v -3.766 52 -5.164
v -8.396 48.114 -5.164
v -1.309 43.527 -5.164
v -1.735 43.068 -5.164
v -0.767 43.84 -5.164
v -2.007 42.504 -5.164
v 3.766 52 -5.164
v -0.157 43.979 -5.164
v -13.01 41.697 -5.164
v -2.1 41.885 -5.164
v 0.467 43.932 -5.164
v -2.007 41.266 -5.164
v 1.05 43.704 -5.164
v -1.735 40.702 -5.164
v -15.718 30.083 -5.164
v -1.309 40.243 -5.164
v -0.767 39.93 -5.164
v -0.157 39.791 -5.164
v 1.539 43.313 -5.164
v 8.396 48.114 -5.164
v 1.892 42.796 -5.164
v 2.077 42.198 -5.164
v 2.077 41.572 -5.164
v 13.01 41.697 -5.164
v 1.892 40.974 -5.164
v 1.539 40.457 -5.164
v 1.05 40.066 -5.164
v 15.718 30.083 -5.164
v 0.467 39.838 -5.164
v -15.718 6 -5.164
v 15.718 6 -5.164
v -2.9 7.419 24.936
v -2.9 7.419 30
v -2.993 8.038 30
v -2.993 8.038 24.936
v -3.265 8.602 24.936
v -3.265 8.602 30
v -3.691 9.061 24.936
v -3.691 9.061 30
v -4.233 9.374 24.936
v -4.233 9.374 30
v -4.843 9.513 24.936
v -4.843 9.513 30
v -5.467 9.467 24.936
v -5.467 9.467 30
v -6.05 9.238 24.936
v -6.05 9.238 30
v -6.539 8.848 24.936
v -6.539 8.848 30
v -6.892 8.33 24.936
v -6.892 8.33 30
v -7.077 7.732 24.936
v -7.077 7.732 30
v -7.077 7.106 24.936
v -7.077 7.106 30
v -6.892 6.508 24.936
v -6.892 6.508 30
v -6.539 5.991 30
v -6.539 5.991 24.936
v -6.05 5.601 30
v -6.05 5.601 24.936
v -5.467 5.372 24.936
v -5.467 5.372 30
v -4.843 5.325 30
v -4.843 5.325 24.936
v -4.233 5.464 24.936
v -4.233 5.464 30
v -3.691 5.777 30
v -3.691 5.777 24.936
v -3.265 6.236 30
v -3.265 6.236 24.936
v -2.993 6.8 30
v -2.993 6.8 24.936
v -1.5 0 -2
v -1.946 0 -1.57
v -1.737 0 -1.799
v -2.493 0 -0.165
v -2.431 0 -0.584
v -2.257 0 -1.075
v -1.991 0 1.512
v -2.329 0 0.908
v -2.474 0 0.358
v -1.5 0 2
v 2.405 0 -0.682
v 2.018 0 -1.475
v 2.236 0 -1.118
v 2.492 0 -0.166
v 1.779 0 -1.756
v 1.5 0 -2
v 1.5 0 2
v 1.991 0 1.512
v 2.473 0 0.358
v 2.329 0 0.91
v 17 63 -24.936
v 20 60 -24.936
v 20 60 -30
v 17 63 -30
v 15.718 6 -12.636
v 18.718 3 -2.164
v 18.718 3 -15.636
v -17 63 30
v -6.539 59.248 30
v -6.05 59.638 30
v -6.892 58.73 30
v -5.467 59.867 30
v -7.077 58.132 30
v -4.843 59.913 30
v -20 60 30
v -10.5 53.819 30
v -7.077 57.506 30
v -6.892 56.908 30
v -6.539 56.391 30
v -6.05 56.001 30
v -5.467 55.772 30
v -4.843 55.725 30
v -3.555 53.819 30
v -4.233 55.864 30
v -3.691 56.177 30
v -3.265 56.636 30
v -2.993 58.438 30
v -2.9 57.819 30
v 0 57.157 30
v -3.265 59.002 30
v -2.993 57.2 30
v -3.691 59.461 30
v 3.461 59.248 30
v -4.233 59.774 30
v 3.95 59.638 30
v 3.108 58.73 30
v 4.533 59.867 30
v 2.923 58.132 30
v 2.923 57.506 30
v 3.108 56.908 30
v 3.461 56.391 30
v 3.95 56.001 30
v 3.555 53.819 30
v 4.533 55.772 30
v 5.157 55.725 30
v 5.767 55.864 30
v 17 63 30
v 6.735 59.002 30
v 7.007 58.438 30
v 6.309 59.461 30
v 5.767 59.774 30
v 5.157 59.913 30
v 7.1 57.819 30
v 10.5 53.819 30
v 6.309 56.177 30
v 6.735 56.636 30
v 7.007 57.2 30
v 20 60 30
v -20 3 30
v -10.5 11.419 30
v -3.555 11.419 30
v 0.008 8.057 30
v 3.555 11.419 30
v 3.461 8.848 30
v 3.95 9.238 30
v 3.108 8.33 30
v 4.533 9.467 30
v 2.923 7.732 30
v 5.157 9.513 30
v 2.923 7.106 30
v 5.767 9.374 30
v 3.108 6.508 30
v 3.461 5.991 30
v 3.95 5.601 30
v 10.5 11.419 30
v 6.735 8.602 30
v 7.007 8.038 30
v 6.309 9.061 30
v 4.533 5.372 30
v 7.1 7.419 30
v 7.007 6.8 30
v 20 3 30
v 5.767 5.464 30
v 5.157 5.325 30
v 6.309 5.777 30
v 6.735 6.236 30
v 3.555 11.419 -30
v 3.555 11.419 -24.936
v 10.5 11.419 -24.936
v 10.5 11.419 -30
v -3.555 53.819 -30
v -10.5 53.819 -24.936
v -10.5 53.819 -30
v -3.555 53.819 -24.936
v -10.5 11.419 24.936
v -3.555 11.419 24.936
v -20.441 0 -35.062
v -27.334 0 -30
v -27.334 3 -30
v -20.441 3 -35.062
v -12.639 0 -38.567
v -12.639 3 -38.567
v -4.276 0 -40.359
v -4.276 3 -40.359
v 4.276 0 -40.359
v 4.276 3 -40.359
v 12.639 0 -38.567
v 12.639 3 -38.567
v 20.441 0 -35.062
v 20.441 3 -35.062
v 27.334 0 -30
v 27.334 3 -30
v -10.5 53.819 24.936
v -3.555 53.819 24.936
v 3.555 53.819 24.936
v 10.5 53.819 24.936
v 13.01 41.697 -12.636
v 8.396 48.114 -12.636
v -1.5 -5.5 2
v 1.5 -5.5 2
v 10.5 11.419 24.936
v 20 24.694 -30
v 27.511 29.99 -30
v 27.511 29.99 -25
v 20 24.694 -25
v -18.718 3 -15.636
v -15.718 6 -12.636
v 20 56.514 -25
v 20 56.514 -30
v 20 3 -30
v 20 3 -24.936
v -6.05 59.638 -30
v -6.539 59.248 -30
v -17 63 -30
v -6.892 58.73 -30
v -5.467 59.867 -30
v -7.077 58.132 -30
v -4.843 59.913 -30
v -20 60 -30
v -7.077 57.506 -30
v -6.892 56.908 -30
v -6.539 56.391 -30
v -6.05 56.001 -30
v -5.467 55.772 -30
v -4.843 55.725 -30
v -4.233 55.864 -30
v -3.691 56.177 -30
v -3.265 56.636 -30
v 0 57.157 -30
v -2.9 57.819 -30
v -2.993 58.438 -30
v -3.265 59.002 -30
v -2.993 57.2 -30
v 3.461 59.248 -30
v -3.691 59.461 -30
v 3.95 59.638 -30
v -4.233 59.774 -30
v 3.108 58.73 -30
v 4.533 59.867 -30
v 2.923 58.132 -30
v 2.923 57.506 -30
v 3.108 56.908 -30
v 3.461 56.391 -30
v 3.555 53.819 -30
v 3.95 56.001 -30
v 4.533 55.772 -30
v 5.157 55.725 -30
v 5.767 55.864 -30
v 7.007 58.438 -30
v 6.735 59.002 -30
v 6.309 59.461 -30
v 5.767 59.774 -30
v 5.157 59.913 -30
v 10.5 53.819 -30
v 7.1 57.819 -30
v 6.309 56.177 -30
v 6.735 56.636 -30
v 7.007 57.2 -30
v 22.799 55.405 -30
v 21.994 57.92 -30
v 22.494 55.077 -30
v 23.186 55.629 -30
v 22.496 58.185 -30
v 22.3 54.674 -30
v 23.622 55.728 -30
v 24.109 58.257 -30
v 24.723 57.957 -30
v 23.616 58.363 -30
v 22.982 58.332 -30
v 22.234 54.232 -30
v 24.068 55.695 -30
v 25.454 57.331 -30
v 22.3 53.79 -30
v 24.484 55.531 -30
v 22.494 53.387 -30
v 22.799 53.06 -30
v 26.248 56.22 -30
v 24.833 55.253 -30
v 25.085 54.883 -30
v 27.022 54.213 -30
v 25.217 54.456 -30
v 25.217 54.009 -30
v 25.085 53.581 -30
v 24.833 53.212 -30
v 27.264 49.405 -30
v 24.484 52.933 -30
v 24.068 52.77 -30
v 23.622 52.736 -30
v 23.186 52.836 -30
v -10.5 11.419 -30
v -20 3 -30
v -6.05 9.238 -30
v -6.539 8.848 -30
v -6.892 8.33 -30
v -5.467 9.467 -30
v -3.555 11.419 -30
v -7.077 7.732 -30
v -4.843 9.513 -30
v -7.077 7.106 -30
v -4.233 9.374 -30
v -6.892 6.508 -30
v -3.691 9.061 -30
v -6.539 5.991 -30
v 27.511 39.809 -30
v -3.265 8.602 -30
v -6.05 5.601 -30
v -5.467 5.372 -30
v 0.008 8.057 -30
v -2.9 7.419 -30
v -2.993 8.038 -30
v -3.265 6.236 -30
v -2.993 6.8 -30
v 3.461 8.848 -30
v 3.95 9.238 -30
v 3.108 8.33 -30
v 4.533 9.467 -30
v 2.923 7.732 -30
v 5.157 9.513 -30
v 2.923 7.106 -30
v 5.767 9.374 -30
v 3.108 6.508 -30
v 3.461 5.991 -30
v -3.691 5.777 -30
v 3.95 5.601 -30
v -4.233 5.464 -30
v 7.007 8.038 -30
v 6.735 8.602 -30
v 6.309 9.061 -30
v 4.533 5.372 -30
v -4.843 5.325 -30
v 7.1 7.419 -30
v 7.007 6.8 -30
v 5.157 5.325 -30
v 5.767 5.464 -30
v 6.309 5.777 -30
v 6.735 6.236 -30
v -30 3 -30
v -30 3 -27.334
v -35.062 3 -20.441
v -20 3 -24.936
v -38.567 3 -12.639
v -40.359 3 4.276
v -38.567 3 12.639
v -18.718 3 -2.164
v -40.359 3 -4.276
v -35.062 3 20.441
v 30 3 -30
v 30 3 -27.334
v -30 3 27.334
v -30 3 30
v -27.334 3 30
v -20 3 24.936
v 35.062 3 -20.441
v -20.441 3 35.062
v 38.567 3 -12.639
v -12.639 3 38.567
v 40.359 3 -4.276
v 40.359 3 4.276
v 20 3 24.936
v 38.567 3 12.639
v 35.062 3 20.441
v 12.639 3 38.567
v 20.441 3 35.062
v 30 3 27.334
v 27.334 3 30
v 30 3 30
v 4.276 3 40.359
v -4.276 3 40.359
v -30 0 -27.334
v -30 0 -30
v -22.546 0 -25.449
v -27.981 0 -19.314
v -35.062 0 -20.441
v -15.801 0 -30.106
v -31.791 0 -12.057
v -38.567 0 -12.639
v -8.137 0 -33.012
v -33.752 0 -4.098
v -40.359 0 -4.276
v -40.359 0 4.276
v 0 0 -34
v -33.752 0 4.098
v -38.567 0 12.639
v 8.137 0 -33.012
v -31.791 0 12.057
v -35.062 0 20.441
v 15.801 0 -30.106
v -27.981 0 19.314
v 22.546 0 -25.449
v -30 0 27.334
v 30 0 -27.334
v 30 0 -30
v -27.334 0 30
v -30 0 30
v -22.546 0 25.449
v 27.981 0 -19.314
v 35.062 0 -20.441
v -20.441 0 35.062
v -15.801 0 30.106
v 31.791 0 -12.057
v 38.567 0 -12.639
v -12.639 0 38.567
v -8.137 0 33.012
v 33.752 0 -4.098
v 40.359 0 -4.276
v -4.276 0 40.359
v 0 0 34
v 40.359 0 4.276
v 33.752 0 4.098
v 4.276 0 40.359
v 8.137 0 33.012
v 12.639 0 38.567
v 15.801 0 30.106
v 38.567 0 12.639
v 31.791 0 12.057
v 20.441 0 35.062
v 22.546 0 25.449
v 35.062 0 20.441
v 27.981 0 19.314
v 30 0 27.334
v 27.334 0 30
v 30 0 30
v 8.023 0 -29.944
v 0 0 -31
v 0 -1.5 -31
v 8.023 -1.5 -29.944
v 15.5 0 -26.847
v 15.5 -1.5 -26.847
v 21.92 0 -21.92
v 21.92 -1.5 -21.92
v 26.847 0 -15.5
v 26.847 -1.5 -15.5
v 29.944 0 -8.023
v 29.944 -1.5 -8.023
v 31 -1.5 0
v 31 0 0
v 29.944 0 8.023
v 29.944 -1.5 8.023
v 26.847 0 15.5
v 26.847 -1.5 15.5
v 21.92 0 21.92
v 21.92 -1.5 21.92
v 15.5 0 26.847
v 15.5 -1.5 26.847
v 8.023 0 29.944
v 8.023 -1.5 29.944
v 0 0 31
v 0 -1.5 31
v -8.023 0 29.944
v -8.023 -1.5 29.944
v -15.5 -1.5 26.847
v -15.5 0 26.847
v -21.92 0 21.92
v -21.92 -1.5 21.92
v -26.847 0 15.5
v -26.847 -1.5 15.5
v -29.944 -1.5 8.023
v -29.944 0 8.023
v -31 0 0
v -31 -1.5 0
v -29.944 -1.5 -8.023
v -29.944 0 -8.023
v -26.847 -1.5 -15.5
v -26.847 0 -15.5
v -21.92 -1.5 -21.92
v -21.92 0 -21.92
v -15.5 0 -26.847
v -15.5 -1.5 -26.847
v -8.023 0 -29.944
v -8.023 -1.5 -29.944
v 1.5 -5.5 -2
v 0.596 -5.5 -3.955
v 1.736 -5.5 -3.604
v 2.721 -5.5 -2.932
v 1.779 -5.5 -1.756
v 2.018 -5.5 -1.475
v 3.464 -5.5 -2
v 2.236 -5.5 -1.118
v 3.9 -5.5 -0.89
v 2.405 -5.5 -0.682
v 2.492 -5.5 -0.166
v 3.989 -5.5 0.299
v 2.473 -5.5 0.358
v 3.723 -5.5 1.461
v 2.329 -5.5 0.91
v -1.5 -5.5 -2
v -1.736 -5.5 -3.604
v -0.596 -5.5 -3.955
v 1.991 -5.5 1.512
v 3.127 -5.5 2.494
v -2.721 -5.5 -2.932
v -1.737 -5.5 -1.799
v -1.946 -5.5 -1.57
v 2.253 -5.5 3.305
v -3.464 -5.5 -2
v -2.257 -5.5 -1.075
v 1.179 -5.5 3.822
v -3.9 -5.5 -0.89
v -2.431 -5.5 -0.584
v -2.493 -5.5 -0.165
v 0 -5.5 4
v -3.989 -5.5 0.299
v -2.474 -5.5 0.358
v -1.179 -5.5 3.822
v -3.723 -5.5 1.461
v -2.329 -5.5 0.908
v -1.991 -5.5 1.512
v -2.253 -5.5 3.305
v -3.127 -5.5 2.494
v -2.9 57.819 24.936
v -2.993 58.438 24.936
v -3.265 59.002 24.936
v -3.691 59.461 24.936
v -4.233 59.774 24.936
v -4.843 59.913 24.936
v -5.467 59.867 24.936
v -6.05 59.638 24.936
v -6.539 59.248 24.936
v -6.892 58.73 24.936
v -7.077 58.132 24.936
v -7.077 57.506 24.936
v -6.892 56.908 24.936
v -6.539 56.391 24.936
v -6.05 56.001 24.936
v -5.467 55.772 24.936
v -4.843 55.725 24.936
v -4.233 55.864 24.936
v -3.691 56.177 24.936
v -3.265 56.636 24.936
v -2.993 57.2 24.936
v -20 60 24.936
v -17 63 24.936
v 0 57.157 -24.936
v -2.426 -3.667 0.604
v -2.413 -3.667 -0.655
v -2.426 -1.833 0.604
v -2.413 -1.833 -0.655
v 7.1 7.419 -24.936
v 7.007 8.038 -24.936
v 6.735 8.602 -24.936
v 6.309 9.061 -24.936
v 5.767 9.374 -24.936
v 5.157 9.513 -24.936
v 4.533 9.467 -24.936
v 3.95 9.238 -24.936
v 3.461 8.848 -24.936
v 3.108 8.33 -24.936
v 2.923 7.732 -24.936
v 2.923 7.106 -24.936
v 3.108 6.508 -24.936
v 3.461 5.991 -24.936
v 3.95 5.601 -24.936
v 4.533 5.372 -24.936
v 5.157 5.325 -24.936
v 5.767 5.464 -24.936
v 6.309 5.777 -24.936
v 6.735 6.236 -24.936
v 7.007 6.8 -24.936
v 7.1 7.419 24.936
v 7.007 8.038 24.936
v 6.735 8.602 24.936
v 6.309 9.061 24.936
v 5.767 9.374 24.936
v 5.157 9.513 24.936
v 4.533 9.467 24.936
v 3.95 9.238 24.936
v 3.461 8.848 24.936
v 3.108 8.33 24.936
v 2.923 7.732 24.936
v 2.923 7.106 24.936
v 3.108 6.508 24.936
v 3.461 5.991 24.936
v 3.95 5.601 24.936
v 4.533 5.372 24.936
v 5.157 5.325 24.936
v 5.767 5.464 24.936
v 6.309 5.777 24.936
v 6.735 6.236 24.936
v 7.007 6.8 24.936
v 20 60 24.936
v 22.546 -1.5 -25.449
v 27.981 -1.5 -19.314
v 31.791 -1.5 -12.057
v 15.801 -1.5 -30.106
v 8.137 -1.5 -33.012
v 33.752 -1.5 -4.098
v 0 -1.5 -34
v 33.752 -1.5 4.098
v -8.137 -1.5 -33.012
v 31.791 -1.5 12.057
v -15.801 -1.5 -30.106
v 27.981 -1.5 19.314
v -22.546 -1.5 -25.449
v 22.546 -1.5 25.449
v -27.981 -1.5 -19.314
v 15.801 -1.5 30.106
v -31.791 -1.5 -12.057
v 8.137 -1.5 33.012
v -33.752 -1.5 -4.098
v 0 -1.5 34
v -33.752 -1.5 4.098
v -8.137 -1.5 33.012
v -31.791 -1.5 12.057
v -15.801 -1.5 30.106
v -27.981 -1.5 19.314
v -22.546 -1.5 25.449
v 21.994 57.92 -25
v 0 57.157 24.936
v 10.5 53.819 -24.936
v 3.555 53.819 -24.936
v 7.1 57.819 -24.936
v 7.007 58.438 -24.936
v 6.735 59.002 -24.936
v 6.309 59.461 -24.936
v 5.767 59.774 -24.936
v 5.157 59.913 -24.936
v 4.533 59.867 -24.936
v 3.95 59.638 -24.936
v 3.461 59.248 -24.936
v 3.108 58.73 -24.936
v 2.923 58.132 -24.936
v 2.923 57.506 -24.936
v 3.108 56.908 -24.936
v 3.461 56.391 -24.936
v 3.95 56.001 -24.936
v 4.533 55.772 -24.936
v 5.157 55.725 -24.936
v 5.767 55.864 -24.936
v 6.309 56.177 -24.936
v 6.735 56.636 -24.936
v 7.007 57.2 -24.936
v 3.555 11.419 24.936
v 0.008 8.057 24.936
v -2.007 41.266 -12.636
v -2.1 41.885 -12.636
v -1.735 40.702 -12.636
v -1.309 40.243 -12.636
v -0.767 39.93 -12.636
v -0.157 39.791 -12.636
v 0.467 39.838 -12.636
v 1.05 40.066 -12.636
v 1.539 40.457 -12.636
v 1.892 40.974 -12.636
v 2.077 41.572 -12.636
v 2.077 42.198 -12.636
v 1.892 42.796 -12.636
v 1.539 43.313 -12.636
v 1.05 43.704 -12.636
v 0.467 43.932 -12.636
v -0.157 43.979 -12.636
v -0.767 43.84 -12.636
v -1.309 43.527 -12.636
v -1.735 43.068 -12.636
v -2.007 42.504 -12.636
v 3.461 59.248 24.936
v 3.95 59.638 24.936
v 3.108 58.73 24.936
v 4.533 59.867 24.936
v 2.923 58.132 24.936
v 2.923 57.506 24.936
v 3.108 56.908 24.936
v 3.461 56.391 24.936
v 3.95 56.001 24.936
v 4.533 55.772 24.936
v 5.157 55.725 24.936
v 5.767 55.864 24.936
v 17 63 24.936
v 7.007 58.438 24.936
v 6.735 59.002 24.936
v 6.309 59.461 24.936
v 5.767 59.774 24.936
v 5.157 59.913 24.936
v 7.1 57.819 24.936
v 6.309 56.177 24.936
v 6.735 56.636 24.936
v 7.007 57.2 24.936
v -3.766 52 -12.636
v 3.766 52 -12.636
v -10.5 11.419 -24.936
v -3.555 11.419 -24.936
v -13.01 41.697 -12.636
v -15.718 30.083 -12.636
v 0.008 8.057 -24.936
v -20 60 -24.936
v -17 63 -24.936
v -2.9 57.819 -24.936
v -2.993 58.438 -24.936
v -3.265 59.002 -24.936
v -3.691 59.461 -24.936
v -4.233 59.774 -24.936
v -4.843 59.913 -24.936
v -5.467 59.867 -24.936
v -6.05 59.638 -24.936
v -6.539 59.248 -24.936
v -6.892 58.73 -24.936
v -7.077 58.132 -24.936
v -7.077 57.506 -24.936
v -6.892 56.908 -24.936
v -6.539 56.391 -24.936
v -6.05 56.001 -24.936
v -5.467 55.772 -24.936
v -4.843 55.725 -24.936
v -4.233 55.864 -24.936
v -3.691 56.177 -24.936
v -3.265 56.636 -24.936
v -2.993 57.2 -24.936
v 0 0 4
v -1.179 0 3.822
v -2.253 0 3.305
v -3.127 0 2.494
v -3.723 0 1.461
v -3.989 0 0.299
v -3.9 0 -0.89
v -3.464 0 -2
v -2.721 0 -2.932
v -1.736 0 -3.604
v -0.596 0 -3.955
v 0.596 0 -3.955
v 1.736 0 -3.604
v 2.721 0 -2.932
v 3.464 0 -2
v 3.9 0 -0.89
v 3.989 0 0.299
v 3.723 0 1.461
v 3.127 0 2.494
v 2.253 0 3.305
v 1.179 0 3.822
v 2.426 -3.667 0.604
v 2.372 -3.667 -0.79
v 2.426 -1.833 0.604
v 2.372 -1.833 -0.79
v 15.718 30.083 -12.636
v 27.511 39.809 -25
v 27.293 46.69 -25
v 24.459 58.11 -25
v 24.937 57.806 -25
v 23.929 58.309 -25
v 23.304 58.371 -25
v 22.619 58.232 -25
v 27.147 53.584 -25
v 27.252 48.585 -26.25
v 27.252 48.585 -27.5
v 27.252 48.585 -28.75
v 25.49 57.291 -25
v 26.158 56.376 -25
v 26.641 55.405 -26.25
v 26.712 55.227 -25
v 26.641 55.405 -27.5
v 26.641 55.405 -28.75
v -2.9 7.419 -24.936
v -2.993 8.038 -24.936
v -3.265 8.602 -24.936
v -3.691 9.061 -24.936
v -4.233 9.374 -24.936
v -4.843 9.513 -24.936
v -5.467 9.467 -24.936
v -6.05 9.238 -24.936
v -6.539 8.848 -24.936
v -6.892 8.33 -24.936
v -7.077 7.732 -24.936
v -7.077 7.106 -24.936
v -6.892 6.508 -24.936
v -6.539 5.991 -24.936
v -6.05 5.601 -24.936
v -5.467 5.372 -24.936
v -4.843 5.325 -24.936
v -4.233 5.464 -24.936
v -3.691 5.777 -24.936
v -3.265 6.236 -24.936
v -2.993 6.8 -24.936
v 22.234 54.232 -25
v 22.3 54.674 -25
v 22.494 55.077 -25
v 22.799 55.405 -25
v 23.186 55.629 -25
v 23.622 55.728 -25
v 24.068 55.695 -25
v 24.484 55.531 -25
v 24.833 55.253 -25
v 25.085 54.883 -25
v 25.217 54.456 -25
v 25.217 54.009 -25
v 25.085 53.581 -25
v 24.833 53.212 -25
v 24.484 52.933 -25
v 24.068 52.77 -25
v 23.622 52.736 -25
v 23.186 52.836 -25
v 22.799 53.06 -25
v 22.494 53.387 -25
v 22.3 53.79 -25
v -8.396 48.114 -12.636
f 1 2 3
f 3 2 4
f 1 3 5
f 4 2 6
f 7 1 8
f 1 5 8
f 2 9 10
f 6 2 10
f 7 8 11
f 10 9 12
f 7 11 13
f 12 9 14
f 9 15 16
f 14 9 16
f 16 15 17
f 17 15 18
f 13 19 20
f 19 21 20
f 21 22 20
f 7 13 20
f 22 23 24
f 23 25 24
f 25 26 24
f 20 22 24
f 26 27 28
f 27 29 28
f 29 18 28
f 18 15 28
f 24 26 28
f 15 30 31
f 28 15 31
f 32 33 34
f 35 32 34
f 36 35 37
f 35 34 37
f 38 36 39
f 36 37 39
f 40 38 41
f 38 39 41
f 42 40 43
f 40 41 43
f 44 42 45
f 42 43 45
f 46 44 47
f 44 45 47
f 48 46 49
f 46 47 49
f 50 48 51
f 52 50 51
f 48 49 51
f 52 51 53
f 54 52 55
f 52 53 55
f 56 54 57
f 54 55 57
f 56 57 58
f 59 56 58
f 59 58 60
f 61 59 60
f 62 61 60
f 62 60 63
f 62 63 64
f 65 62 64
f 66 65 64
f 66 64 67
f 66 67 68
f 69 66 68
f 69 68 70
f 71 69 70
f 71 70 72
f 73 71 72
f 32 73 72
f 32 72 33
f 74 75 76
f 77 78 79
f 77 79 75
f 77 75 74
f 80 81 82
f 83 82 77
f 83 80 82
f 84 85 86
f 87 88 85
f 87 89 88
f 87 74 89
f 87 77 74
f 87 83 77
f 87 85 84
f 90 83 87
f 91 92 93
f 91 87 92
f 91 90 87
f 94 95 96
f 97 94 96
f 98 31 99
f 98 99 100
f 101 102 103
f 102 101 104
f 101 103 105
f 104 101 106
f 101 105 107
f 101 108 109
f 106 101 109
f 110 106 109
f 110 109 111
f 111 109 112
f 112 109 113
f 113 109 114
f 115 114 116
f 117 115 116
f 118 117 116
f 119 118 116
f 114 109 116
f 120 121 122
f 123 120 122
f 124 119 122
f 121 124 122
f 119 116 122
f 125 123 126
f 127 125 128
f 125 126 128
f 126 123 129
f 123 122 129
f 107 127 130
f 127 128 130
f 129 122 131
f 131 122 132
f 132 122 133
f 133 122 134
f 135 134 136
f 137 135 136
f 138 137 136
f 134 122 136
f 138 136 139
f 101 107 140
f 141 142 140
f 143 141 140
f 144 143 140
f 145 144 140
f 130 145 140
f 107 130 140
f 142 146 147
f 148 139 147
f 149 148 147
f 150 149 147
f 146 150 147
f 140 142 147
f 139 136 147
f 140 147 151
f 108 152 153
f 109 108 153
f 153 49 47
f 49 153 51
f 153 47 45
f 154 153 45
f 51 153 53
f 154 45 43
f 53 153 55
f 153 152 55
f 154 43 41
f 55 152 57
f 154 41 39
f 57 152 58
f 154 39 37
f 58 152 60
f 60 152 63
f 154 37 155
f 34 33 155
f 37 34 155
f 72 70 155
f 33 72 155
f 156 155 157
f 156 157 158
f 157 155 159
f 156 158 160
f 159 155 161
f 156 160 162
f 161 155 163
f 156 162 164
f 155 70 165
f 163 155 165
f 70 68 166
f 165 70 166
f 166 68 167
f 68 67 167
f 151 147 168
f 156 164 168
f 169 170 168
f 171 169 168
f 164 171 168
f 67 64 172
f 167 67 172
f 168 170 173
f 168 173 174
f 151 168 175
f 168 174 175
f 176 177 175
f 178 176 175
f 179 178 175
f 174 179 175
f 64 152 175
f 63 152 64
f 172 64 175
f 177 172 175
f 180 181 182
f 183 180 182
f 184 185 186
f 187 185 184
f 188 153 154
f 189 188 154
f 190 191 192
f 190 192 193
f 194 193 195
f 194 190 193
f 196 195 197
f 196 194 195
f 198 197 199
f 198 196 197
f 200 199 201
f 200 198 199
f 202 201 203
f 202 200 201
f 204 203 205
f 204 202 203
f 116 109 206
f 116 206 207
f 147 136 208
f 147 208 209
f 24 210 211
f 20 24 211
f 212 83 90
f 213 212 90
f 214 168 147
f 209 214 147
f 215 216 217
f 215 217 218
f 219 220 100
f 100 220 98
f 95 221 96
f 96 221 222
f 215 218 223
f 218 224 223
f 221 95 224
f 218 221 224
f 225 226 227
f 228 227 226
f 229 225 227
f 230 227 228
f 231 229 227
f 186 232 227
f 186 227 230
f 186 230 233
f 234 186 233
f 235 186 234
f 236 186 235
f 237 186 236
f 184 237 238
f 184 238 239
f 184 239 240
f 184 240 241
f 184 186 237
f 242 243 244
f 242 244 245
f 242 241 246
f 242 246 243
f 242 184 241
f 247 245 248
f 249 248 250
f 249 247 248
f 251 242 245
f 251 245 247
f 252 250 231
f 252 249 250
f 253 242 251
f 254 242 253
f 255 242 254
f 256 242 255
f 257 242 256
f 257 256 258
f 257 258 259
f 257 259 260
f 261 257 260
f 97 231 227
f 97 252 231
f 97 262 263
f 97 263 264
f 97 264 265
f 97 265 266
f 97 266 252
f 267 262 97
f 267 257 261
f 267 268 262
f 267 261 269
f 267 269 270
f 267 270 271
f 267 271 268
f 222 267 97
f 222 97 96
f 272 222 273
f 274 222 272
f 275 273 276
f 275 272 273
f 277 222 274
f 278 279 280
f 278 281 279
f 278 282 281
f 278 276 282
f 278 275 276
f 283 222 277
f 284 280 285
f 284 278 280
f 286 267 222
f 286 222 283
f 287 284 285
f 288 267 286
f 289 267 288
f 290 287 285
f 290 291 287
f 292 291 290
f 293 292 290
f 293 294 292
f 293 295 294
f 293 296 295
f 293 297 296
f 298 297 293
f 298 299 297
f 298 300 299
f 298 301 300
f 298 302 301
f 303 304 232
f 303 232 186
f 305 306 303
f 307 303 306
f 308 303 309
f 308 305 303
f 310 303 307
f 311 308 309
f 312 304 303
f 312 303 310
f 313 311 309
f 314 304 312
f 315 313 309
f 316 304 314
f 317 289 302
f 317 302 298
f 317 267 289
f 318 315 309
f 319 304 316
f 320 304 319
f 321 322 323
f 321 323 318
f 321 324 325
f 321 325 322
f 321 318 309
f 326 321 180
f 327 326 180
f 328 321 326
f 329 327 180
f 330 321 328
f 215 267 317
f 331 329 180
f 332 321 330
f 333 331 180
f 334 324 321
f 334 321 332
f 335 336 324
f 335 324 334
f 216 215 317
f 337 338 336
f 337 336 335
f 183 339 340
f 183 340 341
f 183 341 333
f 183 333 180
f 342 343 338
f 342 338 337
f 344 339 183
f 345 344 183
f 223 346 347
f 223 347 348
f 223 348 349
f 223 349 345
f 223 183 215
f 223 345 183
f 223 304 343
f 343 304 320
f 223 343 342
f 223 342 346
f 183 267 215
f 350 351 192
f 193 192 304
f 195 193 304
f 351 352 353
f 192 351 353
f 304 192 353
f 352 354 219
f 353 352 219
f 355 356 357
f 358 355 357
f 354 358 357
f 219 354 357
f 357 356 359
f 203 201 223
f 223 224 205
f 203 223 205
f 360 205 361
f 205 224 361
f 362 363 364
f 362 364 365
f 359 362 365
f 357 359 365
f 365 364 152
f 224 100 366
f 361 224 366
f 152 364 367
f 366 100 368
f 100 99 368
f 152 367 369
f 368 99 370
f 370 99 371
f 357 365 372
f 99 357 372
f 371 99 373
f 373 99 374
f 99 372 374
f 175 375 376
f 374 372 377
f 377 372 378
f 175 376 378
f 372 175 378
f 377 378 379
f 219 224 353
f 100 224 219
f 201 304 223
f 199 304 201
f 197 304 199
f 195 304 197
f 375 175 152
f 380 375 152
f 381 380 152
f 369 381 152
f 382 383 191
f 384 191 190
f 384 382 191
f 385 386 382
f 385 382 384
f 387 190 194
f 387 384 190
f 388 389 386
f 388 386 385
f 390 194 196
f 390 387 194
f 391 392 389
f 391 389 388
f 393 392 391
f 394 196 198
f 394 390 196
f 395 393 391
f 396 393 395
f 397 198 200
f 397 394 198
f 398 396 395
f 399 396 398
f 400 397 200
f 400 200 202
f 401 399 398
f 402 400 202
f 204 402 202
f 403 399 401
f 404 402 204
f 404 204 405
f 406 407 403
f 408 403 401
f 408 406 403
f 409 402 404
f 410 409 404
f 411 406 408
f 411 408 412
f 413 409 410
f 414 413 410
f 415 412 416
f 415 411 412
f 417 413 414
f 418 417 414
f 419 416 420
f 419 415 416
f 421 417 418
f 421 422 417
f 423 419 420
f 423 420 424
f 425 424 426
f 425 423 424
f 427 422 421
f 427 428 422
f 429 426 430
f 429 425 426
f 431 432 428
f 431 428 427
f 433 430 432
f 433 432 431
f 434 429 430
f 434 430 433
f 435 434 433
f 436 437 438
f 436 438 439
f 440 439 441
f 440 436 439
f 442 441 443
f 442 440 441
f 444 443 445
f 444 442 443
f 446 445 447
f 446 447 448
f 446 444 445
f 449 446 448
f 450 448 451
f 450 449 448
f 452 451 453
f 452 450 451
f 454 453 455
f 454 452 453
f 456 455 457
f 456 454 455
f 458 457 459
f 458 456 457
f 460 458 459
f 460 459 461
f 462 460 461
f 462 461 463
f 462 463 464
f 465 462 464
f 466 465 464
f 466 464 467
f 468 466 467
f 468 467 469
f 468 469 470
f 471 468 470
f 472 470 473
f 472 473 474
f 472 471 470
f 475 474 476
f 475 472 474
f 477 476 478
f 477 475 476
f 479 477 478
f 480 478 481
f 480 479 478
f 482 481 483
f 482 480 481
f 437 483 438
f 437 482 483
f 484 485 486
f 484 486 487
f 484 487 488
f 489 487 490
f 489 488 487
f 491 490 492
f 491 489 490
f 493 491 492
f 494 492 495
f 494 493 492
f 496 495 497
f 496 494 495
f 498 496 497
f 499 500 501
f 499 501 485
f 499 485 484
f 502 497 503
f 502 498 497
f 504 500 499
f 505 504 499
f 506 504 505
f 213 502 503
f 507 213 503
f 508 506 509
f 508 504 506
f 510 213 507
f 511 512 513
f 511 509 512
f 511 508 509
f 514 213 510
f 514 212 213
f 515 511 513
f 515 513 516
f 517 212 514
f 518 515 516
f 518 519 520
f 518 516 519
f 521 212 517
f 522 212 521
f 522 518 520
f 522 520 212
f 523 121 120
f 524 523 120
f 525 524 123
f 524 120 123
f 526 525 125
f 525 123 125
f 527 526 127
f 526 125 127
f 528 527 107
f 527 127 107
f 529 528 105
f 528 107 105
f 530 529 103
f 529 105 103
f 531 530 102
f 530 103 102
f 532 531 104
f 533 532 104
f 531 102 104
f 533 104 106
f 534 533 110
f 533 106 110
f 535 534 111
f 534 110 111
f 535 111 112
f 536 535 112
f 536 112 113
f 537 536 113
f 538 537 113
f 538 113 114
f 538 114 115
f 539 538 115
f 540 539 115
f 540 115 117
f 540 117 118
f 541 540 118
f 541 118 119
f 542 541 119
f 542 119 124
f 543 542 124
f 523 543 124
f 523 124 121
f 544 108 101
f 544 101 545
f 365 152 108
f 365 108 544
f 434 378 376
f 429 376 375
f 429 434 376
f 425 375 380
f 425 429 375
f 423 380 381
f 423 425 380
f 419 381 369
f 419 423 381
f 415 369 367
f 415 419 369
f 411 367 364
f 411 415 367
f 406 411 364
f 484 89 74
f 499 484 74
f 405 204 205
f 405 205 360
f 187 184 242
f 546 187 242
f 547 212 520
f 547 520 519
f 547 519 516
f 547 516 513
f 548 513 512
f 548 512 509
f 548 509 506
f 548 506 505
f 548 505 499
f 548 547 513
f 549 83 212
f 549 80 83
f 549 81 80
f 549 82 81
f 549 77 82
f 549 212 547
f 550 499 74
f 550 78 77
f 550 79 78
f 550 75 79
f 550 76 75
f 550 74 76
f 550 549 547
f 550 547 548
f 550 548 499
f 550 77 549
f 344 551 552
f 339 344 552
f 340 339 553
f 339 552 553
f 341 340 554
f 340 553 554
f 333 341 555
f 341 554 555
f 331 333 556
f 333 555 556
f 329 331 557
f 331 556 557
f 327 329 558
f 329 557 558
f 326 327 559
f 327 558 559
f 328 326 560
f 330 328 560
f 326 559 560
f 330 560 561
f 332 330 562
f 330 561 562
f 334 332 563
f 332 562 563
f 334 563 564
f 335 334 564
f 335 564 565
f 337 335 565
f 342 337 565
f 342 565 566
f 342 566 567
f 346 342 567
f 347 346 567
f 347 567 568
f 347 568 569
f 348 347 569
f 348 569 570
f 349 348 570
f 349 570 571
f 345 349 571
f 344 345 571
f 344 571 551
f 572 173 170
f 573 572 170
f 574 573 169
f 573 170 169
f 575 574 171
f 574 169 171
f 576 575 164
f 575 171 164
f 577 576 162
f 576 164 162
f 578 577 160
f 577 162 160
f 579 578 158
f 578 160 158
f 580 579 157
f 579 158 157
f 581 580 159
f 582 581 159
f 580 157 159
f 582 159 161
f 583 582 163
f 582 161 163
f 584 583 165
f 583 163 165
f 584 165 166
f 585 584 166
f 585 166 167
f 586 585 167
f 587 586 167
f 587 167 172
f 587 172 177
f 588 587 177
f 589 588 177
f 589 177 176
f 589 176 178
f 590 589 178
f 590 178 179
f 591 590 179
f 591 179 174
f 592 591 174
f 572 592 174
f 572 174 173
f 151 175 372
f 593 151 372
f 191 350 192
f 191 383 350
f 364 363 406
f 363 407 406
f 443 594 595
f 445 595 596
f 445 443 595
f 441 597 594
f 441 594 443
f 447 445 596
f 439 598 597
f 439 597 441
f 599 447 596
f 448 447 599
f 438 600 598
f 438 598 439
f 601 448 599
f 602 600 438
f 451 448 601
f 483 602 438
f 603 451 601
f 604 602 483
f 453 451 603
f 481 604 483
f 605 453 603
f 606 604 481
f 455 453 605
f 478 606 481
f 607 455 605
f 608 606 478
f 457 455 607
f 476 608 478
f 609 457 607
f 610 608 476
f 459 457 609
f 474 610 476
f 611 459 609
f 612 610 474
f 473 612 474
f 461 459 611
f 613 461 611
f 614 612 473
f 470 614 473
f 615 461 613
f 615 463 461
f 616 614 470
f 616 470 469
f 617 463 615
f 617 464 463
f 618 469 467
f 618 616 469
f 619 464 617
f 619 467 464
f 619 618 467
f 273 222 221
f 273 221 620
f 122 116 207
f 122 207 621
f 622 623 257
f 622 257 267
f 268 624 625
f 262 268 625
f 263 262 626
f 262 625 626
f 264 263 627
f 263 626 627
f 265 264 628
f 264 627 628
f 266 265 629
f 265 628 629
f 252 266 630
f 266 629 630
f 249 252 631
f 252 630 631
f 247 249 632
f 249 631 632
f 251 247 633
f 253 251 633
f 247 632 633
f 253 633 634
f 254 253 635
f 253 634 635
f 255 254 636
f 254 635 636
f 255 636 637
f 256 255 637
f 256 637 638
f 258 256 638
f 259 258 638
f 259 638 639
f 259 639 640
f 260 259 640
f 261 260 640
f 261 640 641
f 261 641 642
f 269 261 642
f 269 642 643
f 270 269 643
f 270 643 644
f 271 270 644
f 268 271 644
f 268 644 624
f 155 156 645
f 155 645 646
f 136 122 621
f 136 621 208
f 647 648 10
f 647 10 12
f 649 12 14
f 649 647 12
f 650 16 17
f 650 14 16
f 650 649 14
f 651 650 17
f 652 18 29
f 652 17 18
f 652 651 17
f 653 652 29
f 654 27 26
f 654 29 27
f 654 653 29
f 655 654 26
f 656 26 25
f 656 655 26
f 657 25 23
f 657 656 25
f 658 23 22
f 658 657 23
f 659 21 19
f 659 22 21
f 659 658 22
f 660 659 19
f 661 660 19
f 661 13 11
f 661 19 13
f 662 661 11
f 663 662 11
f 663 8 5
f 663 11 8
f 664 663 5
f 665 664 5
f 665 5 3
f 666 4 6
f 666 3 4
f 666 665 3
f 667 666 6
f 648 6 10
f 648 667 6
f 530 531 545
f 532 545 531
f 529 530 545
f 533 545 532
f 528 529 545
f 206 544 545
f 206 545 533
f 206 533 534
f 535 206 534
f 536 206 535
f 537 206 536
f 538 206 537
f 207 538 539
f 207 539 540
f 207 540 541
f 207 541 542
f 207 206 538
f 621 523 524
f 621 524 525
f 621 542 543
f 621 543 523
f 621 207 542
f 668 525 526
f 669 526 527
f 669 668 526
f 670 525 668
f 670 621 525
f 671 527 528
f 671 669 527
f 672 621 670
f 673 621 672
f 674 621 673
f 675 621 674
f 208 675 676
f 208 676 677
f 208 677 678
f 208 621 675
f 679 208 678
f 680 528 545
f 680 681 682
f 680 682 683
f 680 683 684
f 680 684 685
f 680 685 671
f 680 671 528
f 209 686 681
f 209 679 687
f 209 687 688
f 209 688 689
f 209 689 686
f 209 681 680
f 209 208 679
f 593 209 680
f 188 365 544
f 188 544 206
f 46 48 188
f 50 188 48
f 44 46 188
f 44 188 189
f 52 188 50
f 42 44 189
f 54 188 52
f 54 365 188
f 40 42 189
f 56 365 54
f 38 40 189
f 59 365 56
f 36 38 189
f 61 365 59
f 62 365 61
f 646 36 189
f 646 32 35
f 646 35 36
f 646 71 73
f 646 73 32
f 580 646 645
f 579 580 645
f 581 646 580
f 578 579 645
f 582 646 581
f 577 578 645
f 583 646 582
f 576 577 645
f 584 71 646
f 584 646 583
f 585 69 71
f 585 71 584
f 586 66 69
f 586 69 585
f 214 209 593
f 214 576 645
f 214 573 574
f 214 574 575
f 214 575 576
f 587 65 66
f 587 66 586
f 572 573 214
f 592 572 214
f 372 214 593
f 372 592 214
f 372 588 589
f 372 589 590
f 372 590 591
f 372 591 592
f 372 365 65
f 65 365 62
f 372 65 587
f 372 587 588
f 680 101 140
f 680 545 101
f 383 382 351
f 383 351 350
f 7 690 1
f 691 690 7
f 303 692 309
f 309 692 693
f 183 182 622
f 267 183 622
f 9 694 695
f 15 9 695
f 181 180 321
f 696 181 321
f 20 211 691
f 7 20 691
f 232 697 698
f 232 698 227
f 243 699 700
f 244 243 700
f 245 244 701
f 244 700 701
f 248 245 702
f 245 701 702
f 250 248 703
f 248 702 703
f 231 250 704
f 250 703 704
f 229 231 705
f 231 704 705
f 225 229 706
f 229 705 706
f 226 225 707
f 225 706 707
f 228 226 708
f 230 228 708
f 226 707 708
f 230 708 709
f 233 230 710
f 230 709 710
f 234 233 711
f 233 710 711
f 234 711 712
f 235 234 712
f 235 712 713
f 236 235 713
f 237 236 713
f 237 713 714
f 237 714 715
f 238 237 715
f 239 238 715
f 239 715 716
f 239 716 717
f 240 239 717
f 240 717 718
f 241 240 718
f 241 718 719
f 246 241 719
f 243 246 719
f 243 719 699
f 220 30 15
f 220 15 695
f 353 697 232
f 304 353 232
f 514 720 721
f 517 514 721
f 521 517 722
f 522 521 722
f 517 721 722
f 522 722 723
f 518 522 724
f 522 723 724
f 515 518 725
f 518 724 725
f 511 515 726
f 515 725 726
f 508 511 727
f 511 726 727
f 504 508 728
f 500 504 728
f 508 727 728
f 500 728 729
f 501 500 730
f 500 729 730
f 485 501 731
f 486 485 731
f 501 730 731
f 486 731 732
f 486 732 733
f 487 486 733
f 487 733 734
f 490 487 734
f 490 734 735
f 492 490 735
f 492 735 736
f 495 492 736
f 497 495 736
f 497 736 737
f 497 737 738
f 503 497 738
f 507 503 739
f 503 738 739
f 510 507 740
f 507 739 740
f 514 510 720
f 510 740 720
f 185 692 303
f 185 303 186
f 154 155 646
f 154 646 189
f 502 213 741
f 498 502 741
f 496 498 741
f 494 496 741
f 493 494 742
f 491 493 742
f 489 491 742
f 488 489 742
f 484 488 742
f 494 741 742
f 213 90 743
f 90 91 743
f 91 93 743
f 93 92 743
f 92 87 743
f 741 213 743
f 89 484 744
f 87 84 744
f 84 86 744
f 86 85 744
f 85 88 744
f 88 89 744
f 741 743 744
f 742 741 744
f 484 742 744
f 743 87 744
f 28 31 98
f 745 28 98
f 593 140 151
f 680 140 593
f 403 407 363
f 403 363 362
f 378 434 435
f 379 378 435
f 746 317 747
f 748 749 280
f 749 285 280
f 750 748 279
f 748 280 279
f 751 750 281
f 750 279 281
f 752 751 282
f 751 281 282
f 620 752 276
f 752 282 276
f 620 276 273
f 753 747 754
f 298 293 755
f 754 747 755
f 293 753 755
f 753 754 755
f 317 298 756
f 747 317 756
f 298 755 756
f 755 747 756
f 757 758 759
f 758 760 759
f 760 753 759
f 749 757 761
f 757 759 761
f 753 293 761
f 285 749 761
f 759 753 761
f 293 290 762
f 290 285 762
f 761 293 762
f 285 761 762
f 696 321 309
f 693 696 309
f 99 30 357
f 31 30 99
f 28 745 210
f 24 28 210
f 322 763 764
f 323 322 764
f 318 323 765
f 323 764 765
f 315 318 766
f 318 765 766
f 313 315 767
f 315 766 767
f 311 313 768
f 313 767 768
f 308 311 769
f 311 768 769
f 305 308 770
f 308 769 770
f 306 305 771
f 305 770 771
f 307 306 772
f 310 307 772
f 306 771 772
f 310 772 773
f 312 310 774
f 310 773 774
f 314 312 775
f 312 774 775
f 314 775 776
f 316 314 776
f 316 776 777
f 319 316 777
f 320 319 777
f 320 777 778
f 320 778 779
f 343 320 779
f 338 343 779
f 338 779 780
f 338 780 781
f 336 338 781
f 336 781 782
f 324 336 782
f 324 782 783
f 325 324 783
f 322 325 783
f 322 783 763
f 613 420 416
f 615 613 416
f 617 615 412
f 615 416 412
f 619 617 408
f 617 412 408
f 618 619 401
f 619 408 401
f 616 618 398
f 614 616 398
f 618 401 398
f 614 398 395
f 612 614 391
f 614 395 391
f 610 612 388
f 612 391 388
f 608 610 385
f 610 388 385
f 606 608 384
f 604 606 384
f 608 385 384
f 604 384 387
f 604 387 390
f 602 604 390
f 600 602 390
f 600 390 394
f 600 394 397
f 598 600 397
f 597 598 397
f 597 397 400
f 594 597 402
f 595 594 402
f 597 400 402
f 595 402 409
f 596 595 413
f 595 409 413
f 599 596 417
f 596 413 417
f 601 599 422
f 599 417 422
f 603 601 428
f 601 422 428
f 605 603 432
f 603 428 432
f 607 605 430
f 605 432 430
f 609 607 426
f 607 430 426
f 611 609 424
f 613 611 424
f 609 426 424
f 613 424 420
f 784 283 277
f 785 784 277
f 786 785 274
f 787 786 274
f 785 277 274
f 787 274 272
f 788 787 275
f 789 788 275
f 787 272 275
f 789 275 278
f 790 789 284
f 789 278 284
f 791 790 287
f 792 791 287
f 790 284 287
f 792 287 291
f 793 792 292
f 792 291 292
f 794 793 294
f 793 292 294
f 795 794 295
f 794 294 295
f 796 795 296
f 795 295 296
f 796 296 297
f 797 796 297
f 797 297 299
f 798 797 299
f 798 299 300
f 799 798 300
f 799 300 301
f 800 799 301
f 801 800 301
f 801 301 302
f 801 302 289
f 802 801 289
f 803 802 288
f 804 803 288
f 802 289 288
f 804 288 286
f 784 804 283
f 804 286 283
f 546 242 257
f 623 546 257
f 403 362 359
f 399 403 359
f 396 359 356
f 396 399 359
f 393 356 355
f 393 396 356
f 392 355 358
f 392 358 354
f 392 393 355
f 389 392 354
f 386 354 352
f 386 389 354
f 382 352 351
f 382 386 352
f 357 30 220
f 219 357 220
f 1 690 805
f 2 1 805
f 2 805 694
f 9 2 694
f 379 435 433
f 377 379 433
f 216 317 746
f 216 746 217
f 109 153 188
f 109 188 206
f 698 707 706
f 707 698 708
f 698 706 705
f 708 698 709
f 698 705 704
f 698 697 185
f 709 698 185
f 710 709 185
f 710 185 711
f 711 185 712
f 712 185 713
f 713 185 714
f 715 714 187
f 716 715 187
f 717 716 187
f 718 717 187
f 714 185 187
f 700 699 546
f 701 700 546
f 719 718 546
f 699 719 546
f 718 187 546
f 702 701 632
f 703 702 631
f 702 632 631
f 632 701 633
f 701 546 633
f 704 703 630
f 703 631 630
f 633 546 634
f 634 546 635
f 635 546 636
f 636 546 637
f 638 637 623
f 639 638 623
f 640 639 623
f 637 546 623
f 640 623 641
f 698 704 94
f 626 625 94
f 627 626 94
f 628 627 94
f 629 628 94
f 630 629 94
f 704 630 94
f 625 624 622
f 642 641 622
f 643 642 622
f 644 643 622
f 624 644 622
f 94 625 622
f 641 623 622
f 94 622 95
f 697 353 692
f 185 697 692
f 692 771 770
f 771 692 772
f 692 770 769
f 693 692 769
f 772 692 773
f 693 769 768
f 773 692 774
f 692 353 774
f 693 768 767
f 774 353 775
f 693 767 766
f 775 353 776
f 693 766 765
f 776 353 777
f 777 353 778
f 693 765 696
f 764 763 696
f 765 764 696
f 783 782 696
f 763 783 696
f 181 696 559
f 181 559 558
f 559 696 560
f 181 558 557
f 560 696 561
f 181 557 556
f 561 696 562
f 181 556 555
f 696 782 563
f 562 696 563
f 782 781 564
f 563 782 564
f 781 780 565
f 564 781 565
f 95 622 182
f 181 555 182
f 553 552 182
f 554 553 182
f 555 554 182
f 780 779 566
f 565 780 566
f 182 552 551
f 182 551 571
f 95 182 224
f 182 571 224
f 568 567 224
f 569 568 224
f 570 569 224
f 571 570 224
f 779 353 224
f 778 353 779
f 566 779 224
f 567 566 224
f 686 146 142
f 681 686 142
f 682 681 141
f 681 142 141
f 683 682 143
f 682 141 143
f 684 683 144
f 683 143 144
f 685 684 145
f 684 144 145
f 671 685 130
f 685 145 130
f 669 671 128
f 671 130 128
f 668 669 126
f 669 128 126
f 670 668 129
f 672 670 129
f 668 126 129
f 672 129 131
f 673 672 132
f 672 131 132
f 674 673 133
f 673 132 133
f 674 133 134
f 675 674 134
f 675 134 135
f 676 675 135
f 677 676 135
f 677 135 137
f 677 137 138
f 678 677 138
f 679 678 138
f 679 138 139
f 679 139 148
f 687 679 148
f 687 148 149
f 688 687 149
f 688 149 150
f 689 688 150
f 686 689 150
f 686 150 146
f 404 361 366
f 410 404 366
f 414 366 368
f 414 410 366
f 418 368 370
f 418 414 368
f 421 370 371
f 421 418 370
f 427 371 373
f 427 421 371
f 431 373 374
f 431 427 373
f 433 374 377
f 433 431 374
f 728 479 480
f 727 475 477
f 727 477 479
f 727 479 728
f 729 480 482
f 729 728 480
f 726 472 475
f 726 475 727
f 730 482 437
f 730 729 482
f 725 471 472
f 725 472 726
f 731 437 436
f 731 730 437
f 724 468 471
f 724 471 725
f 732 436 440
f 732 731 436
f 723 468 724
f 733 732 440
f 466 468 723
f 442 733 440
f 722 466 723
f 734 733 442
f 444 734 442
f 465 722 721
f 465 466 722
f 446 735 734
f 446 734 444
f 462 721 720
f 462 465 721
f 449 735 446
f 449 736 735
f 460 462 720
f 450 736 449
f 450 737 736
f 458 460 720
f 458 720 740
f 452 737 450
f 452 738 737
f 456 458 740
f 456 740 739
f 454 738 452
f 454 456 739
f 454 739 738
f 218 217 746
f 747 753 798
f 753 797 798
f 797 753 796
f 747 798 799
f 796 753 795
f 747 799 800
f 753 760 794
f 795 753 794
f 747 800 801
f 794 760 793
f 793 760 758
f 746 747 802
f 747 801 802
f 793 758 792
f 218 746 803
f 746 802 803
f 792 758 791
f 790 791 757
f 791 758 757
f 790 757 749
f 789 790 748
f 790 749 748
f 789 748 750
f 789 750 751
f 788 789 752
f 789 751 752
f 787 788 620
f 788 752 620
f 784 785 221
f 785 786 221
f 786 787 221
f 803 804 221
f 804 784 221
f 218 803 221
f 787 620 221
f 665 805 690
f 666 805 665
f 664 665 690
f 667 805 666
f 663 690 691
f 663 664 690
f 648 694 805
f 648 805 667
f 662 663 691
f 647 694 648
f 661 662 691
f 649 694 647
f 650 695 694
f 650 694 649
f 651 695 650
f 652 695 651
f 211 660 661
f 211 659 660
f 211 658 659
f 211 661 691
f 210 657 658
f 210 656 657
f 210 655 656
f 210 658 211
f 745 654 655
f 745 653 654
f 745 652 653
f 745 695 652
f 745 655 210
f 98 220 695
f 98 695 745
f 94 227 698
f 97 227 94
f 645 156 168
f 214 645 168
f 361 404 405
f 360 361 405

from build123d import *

# Parameters (mm, degrees)
ESQUISSE1_W                  = 60
ESQUISSE1_H                  = 60
BOSS_EXTRU_1_DEPTH           = 3
ESQUISSE2_W                  = 40
ESQUISSE2_H                  = 5.064093089
BOSS_EXTRU_2_DEPTH           = 60
ESQUISSE3_R                  = 2.1
ESQUISSE3_W                  = 21
ESQUISSE3_H                  = 42.4
ENL_V_MAT_EXTRU_1_DEPTH      = 61
ESQUISSE4_W                  = 31.43634342
ESQUISSE4_H                  = 7.471813822
BOSS_EXTRU_3_DEPTH           = 49
ENL_V_MAT_EXTRU_2_DEPTH      = 49
ENL_V_MAT_EXTRU_2_DEPTH_BACK = 49
ESQUISSE5_R                  = 2.1
ENL_V_MAT_EXTRU_3_DEPTH      = 5
ENL_V_MAT_EXTRU_3_DEPTH_BACK = 12
ENL_V_MAT_EXTRU_7_DEPTH      = 5.686588472
BOSS_EXTRU_4_DEPTH           = 5
ESQUISSE13_R                 = 1.5
ENL_V_MAT_EXTRU_8_DEPTH      = 5
ENL_V_MAT_EXTRU_9_DEPTH      = 10
CHANFREIN1_SIZE              = 3
CHANFREIN2_SIZE              = 3
ESQUISSE15_R                 = 40.585379392
BOSS_EXTRU_5_DEPTH           = 3
ESQUISSE16_R                 = 4
BOSS_EXTRU_6_DEPTH           = 5.5
ESQUISSE17_R                 = 34
ESQUISSE17_R_2               = 31
BOSS_EXTRU_7_DEPTH           = 1.5


with BuildPart() as part:
    # Esquisse1 → Boss.-Extru.1 (new body)
    with BuildSketch(Plane(origin=(0, 0, 0), x_dir=(1, 0, 0), z_dir=(0, 1, 0))):
        Rectangle(ESQUISSE1_W, ESQUISSE1_H)
    extrude(amount=BOSS_EXTRU_1_DEPTH)

    # Esquisse2 → Boss.-Extru.2 (add)
    with BuildSketch(Plane(origin=(0, 3, 0), x_dir=(1, 0, 0), z_dir=(0, 1, 0))):
        with Locations((0, -27.467953456)):
            Rectangle(ESQUISSE2_W, ESQUISSE2_H)
        with Locations((0, 27.467953456)):
            Rectangle(ESQUISSE2_W, ESQUISSE2_H)
    extrude(amount=BOSS_EXTRU_2_DEPTH)

    # Esquisse3 → Enlèv. mat.-Extru.1 (cut)
    with BuildSketch(Plane.XY.offset(30)):
        with Locations((-5, 57.819250322)):
            Circle(ESQUISSE3_R)
        with Locations((5, 57.819250322)):
            Circle(ESQUISSE3_R)
        with Locations((-5, 7.419250322)):
            Circle(ESQUISSE3_R)
        with Locations((5, 7.419250322)):
            Circle(ESQUISSE3_R)
        with Locations((0, 32.619250322)):
            Rectangle(ESQUISSE3_W, ESQUISSE3_H)
    extrude(amount=-ENL_V_MAT_EXTRU_1_DEPTH, mode=Mode.SUBTRACT)

    # Esquisse4 → Boss.-Extru.3 (add)
    with BuildSketch(Plane(origin=(0, 3, 0), x_dir=(1, 0, 0), z_dir=(0, 1, 0))):
        with Locations((0, 8.9)):
            Rectangle(ESQUISSE4_W, ESQUISSE4_H)
    extrude(amount=BOSS_EXTRU_3_DEPTH)

    # Esquisse5 → Enlèv. mat.-Extru.2 (cut, two sides: drawn at the far end of the back side and taken through both)
    with BuildSketch(Plane.XY.offset(-5.164093089).offset(-ENL_V_MAT_EXTRU_2_DEPTH_BACK)):
        with Locations(Location((0, 41.884866589, 0), (0, 0, 180))):
            Circle(ESQUISSE5_R)
    extrude(amount=ENL_V_MAT_EXTRU_2_DEPTH + ENL_V_MAT_EXTRU_2_DEPTH_BACK, mode=Mode.SUBTRACT)

    # Esquisse6 → Enlèv. mat.-Extru.3 (cut, two sides: drawn at the far end of the back side and taken through both)
    with BuildSketch(Plane.XY.offset(-5.164093089).offset(-ENL_V_MAT_EXTRU_3_DEPTH_BACK)):
        Polygon((3.765814794, 52), (-3.765814794, 52), (-8.396406616, 48.113602092), (-13.009515703, 41.697186725), (-16.070942643, 28.570794505), (-19.383993714, 28.570794505), (-19.383993714, 55.569676943), (19.383993714, 55.569676943), (19.383993714, 28.570794505), (16.070942643, 28.570794505), (13.009515703, 41.697186725), (8.396406616, 48.113602092), align=None)
    extrude(amount=ENL_V_MAT_EXTRU_3_DEPTH + ENL_V_MAT_EXTRU_3_DEPTH_BACK, mode=Mode.SUBTRACT)

    # Esquisse11 → Enlèv. mat.-Extru.7 (cut)
    with BuildSketch(Plane.XY.offset(30)):
        Polygon((-3.554651837, 53.819250322), (0, 57.156758738), (3.554651837, 53.819250322), align=None)
        Polygon((3.554651837, 11.419250322), (0.008232601, 8.05699671), (-3.554651837, 11.419250322), align=None)
    enl_v_mat_extru_7 = extrude(amount=-ENL_V_MAT_EXTRU_7_DEPTH, mode=Mode.SUBTRACT)

    # Symétrie1: Enlèv. mat.-Extru.7 across plane
    add(enl_v_mat_extru_7.mirror(Plane.XY), mode=Mode.SUBTRACT)

    # Esquisse12 → Boss.-Extru.4 (add)
    with BuildSketch(Plane(origin=(0, 0, -30), x_dir=(-1, 0, 0), z_dir=(0, 0, -1))):
        Polygon((-16.041577075, 53.722563772), (-27.510987985, 61.809968901), (-27.510987985, 29.990434482), (-16.041577075, 21.903029354), align=None)
    extrude(amount=-BOSS_EXTRU_4_DEPTH)

    # Esquisse13 → Enlèv. mat.-Extru.8 (cut)
    with BuildSketch(Plane(origin=(0, 0, -30), x_dir=(-1, 0, 0), z_dir=(0, 0, -1))):
        with Locations((-23.733778696, 54.232255727)):
            Circle(ESQUISSE13_R)
    extrude(amount=-ENL_V_MAT_EXTRU_8_DEPTH, mode=Mode.SUBTRACT)

    # Esquisse14 → Enlèv. mat.-Extru.9 (cut)
    with BuildSketch(Plane(origin=(0, 0, -30), x_dir=(-1, 0, 0), z_dir=(0, 0, -1))):
        with BuildLine():
            Line((-21.71817898, 57.725295885), (-22.313097289, 61.571545457))
            Line((-22.313097289, 61.571545457), (-29.123823422, 63.566297114))
            Line((-29.123823422, 63.566297114), (-31.434035617, 54.282245365))
            Line((-31.434035617, 54.282245365), (-31.802093045, 39.80867485))
            Line((-31.802093045, 39.80867485), (-27.510987985, 39.80867485))
            add(Edge.make_bspline(
                [(-27.510987985, 39.80867485), (-27.476511879, 42.426218442), (-27.330002572, 45.177230576), (-27.18875986, 50.317216066), (-27.834123365, 55.293883989), (-23.939343069, 59.432145797), (-21.71817898, 57.725295885)],
                knots=[0, 0, 0, 0, 0.330124206, 0.401515798, 0.713915923, 1, 1, 1, 1], degree=3))
        make_face()
    extrude(amount=-ENL_V_MAT_EXTRU_9_DEPTH, mode=Mode.SUBTRACT)

    # Chanfrein1
    chanfrein1_edges = [part.edges().sort_by_distance(p)[0] for p in [
        (-20, 63, 27.467953456),
        (20, 63, 27.467953456),
        (20, 63, -27.467953456),
        (-20, 63, -27.467953456),
    ]]
    chamfer(chanfrein1_edges, length=CHANFREIN1_SIZE)

    # Chanfrein2
    chanfrein2_edges = [part.edges().sort_by_distance(p)[0] for p in [
        (15.71817171, 3, -8.9),
        (0, 3, -12.635906911),
        (-15.71817171, 3, -8.9),
        (0, 3, -5.164093089),
    ]]
    chamfer(chanfrein2_edges, length=CHANFREIN2_SIZE)

    # Esquisse15 → Boss.-Extru.5 (add)
    with BuildSketch(Plane.XZ):
        Circle(ESQUISSE15_R)
    extrude(amount=-BOSS_EXTRU_5_DEPTH)

    # Esquisse16 → Boss.-Extru.6 (add)
    with BuildSketch(Plane.XZ):
        with Locations(Location((0, 0, 0), (0, 0, 90))):
            Circle(ESQUISSE16_R)
        with BuildLine():
            Line((1.5, -2), (-1.5, -2))
            add(Edge.make_bspline(
                [(-1.5, 2), (-1.958697555, 1.657983746), (-2.533324792, 0.788068376), (-2.517224478, -0.822180507), (-1.942930835, -1.670082257), (-1.5, -2)],
                knots=[0, 0, 0, 0, 0.368917338, 0.642208585, 1, 1, 1, 1], degree=3))
            Line((-1.5, 2), (1.5, 2))
            add(Edge.make_bspline(
                [(1.5, 2), (1.95810566, 1.657096874), (2.561237256, 0.750226685), (2.498088101, -0.878428585), (1.905080516, -1.696028501), (1.5, -2)],
                knots=[0, 0, 0, 0, 0.369168068, 0.672222531, 1, 1, 1, 1], degree=3))
        make_face(mode=Mode.SUBTRACT)
    extrude(amount=BOSS_EXTRU_6_DEPTH)

    # Esquisse17 → Boss.-Extru.7 (add)
    with BuildSketch(Plane.XZ):
        with Locations(Location((0, 0, 0), (0, 0, 90))):
            Circle(ESQUISSE17_R)
        with Locations(Location((0, 0, 0), (0, 0, 270))):
            Circle(ESQUISSE17_R_2, mode=Mode.SUBTRACT)
    extrude(amount=BOSS_EXTRU_7_DEPTH)


solid = part.part
